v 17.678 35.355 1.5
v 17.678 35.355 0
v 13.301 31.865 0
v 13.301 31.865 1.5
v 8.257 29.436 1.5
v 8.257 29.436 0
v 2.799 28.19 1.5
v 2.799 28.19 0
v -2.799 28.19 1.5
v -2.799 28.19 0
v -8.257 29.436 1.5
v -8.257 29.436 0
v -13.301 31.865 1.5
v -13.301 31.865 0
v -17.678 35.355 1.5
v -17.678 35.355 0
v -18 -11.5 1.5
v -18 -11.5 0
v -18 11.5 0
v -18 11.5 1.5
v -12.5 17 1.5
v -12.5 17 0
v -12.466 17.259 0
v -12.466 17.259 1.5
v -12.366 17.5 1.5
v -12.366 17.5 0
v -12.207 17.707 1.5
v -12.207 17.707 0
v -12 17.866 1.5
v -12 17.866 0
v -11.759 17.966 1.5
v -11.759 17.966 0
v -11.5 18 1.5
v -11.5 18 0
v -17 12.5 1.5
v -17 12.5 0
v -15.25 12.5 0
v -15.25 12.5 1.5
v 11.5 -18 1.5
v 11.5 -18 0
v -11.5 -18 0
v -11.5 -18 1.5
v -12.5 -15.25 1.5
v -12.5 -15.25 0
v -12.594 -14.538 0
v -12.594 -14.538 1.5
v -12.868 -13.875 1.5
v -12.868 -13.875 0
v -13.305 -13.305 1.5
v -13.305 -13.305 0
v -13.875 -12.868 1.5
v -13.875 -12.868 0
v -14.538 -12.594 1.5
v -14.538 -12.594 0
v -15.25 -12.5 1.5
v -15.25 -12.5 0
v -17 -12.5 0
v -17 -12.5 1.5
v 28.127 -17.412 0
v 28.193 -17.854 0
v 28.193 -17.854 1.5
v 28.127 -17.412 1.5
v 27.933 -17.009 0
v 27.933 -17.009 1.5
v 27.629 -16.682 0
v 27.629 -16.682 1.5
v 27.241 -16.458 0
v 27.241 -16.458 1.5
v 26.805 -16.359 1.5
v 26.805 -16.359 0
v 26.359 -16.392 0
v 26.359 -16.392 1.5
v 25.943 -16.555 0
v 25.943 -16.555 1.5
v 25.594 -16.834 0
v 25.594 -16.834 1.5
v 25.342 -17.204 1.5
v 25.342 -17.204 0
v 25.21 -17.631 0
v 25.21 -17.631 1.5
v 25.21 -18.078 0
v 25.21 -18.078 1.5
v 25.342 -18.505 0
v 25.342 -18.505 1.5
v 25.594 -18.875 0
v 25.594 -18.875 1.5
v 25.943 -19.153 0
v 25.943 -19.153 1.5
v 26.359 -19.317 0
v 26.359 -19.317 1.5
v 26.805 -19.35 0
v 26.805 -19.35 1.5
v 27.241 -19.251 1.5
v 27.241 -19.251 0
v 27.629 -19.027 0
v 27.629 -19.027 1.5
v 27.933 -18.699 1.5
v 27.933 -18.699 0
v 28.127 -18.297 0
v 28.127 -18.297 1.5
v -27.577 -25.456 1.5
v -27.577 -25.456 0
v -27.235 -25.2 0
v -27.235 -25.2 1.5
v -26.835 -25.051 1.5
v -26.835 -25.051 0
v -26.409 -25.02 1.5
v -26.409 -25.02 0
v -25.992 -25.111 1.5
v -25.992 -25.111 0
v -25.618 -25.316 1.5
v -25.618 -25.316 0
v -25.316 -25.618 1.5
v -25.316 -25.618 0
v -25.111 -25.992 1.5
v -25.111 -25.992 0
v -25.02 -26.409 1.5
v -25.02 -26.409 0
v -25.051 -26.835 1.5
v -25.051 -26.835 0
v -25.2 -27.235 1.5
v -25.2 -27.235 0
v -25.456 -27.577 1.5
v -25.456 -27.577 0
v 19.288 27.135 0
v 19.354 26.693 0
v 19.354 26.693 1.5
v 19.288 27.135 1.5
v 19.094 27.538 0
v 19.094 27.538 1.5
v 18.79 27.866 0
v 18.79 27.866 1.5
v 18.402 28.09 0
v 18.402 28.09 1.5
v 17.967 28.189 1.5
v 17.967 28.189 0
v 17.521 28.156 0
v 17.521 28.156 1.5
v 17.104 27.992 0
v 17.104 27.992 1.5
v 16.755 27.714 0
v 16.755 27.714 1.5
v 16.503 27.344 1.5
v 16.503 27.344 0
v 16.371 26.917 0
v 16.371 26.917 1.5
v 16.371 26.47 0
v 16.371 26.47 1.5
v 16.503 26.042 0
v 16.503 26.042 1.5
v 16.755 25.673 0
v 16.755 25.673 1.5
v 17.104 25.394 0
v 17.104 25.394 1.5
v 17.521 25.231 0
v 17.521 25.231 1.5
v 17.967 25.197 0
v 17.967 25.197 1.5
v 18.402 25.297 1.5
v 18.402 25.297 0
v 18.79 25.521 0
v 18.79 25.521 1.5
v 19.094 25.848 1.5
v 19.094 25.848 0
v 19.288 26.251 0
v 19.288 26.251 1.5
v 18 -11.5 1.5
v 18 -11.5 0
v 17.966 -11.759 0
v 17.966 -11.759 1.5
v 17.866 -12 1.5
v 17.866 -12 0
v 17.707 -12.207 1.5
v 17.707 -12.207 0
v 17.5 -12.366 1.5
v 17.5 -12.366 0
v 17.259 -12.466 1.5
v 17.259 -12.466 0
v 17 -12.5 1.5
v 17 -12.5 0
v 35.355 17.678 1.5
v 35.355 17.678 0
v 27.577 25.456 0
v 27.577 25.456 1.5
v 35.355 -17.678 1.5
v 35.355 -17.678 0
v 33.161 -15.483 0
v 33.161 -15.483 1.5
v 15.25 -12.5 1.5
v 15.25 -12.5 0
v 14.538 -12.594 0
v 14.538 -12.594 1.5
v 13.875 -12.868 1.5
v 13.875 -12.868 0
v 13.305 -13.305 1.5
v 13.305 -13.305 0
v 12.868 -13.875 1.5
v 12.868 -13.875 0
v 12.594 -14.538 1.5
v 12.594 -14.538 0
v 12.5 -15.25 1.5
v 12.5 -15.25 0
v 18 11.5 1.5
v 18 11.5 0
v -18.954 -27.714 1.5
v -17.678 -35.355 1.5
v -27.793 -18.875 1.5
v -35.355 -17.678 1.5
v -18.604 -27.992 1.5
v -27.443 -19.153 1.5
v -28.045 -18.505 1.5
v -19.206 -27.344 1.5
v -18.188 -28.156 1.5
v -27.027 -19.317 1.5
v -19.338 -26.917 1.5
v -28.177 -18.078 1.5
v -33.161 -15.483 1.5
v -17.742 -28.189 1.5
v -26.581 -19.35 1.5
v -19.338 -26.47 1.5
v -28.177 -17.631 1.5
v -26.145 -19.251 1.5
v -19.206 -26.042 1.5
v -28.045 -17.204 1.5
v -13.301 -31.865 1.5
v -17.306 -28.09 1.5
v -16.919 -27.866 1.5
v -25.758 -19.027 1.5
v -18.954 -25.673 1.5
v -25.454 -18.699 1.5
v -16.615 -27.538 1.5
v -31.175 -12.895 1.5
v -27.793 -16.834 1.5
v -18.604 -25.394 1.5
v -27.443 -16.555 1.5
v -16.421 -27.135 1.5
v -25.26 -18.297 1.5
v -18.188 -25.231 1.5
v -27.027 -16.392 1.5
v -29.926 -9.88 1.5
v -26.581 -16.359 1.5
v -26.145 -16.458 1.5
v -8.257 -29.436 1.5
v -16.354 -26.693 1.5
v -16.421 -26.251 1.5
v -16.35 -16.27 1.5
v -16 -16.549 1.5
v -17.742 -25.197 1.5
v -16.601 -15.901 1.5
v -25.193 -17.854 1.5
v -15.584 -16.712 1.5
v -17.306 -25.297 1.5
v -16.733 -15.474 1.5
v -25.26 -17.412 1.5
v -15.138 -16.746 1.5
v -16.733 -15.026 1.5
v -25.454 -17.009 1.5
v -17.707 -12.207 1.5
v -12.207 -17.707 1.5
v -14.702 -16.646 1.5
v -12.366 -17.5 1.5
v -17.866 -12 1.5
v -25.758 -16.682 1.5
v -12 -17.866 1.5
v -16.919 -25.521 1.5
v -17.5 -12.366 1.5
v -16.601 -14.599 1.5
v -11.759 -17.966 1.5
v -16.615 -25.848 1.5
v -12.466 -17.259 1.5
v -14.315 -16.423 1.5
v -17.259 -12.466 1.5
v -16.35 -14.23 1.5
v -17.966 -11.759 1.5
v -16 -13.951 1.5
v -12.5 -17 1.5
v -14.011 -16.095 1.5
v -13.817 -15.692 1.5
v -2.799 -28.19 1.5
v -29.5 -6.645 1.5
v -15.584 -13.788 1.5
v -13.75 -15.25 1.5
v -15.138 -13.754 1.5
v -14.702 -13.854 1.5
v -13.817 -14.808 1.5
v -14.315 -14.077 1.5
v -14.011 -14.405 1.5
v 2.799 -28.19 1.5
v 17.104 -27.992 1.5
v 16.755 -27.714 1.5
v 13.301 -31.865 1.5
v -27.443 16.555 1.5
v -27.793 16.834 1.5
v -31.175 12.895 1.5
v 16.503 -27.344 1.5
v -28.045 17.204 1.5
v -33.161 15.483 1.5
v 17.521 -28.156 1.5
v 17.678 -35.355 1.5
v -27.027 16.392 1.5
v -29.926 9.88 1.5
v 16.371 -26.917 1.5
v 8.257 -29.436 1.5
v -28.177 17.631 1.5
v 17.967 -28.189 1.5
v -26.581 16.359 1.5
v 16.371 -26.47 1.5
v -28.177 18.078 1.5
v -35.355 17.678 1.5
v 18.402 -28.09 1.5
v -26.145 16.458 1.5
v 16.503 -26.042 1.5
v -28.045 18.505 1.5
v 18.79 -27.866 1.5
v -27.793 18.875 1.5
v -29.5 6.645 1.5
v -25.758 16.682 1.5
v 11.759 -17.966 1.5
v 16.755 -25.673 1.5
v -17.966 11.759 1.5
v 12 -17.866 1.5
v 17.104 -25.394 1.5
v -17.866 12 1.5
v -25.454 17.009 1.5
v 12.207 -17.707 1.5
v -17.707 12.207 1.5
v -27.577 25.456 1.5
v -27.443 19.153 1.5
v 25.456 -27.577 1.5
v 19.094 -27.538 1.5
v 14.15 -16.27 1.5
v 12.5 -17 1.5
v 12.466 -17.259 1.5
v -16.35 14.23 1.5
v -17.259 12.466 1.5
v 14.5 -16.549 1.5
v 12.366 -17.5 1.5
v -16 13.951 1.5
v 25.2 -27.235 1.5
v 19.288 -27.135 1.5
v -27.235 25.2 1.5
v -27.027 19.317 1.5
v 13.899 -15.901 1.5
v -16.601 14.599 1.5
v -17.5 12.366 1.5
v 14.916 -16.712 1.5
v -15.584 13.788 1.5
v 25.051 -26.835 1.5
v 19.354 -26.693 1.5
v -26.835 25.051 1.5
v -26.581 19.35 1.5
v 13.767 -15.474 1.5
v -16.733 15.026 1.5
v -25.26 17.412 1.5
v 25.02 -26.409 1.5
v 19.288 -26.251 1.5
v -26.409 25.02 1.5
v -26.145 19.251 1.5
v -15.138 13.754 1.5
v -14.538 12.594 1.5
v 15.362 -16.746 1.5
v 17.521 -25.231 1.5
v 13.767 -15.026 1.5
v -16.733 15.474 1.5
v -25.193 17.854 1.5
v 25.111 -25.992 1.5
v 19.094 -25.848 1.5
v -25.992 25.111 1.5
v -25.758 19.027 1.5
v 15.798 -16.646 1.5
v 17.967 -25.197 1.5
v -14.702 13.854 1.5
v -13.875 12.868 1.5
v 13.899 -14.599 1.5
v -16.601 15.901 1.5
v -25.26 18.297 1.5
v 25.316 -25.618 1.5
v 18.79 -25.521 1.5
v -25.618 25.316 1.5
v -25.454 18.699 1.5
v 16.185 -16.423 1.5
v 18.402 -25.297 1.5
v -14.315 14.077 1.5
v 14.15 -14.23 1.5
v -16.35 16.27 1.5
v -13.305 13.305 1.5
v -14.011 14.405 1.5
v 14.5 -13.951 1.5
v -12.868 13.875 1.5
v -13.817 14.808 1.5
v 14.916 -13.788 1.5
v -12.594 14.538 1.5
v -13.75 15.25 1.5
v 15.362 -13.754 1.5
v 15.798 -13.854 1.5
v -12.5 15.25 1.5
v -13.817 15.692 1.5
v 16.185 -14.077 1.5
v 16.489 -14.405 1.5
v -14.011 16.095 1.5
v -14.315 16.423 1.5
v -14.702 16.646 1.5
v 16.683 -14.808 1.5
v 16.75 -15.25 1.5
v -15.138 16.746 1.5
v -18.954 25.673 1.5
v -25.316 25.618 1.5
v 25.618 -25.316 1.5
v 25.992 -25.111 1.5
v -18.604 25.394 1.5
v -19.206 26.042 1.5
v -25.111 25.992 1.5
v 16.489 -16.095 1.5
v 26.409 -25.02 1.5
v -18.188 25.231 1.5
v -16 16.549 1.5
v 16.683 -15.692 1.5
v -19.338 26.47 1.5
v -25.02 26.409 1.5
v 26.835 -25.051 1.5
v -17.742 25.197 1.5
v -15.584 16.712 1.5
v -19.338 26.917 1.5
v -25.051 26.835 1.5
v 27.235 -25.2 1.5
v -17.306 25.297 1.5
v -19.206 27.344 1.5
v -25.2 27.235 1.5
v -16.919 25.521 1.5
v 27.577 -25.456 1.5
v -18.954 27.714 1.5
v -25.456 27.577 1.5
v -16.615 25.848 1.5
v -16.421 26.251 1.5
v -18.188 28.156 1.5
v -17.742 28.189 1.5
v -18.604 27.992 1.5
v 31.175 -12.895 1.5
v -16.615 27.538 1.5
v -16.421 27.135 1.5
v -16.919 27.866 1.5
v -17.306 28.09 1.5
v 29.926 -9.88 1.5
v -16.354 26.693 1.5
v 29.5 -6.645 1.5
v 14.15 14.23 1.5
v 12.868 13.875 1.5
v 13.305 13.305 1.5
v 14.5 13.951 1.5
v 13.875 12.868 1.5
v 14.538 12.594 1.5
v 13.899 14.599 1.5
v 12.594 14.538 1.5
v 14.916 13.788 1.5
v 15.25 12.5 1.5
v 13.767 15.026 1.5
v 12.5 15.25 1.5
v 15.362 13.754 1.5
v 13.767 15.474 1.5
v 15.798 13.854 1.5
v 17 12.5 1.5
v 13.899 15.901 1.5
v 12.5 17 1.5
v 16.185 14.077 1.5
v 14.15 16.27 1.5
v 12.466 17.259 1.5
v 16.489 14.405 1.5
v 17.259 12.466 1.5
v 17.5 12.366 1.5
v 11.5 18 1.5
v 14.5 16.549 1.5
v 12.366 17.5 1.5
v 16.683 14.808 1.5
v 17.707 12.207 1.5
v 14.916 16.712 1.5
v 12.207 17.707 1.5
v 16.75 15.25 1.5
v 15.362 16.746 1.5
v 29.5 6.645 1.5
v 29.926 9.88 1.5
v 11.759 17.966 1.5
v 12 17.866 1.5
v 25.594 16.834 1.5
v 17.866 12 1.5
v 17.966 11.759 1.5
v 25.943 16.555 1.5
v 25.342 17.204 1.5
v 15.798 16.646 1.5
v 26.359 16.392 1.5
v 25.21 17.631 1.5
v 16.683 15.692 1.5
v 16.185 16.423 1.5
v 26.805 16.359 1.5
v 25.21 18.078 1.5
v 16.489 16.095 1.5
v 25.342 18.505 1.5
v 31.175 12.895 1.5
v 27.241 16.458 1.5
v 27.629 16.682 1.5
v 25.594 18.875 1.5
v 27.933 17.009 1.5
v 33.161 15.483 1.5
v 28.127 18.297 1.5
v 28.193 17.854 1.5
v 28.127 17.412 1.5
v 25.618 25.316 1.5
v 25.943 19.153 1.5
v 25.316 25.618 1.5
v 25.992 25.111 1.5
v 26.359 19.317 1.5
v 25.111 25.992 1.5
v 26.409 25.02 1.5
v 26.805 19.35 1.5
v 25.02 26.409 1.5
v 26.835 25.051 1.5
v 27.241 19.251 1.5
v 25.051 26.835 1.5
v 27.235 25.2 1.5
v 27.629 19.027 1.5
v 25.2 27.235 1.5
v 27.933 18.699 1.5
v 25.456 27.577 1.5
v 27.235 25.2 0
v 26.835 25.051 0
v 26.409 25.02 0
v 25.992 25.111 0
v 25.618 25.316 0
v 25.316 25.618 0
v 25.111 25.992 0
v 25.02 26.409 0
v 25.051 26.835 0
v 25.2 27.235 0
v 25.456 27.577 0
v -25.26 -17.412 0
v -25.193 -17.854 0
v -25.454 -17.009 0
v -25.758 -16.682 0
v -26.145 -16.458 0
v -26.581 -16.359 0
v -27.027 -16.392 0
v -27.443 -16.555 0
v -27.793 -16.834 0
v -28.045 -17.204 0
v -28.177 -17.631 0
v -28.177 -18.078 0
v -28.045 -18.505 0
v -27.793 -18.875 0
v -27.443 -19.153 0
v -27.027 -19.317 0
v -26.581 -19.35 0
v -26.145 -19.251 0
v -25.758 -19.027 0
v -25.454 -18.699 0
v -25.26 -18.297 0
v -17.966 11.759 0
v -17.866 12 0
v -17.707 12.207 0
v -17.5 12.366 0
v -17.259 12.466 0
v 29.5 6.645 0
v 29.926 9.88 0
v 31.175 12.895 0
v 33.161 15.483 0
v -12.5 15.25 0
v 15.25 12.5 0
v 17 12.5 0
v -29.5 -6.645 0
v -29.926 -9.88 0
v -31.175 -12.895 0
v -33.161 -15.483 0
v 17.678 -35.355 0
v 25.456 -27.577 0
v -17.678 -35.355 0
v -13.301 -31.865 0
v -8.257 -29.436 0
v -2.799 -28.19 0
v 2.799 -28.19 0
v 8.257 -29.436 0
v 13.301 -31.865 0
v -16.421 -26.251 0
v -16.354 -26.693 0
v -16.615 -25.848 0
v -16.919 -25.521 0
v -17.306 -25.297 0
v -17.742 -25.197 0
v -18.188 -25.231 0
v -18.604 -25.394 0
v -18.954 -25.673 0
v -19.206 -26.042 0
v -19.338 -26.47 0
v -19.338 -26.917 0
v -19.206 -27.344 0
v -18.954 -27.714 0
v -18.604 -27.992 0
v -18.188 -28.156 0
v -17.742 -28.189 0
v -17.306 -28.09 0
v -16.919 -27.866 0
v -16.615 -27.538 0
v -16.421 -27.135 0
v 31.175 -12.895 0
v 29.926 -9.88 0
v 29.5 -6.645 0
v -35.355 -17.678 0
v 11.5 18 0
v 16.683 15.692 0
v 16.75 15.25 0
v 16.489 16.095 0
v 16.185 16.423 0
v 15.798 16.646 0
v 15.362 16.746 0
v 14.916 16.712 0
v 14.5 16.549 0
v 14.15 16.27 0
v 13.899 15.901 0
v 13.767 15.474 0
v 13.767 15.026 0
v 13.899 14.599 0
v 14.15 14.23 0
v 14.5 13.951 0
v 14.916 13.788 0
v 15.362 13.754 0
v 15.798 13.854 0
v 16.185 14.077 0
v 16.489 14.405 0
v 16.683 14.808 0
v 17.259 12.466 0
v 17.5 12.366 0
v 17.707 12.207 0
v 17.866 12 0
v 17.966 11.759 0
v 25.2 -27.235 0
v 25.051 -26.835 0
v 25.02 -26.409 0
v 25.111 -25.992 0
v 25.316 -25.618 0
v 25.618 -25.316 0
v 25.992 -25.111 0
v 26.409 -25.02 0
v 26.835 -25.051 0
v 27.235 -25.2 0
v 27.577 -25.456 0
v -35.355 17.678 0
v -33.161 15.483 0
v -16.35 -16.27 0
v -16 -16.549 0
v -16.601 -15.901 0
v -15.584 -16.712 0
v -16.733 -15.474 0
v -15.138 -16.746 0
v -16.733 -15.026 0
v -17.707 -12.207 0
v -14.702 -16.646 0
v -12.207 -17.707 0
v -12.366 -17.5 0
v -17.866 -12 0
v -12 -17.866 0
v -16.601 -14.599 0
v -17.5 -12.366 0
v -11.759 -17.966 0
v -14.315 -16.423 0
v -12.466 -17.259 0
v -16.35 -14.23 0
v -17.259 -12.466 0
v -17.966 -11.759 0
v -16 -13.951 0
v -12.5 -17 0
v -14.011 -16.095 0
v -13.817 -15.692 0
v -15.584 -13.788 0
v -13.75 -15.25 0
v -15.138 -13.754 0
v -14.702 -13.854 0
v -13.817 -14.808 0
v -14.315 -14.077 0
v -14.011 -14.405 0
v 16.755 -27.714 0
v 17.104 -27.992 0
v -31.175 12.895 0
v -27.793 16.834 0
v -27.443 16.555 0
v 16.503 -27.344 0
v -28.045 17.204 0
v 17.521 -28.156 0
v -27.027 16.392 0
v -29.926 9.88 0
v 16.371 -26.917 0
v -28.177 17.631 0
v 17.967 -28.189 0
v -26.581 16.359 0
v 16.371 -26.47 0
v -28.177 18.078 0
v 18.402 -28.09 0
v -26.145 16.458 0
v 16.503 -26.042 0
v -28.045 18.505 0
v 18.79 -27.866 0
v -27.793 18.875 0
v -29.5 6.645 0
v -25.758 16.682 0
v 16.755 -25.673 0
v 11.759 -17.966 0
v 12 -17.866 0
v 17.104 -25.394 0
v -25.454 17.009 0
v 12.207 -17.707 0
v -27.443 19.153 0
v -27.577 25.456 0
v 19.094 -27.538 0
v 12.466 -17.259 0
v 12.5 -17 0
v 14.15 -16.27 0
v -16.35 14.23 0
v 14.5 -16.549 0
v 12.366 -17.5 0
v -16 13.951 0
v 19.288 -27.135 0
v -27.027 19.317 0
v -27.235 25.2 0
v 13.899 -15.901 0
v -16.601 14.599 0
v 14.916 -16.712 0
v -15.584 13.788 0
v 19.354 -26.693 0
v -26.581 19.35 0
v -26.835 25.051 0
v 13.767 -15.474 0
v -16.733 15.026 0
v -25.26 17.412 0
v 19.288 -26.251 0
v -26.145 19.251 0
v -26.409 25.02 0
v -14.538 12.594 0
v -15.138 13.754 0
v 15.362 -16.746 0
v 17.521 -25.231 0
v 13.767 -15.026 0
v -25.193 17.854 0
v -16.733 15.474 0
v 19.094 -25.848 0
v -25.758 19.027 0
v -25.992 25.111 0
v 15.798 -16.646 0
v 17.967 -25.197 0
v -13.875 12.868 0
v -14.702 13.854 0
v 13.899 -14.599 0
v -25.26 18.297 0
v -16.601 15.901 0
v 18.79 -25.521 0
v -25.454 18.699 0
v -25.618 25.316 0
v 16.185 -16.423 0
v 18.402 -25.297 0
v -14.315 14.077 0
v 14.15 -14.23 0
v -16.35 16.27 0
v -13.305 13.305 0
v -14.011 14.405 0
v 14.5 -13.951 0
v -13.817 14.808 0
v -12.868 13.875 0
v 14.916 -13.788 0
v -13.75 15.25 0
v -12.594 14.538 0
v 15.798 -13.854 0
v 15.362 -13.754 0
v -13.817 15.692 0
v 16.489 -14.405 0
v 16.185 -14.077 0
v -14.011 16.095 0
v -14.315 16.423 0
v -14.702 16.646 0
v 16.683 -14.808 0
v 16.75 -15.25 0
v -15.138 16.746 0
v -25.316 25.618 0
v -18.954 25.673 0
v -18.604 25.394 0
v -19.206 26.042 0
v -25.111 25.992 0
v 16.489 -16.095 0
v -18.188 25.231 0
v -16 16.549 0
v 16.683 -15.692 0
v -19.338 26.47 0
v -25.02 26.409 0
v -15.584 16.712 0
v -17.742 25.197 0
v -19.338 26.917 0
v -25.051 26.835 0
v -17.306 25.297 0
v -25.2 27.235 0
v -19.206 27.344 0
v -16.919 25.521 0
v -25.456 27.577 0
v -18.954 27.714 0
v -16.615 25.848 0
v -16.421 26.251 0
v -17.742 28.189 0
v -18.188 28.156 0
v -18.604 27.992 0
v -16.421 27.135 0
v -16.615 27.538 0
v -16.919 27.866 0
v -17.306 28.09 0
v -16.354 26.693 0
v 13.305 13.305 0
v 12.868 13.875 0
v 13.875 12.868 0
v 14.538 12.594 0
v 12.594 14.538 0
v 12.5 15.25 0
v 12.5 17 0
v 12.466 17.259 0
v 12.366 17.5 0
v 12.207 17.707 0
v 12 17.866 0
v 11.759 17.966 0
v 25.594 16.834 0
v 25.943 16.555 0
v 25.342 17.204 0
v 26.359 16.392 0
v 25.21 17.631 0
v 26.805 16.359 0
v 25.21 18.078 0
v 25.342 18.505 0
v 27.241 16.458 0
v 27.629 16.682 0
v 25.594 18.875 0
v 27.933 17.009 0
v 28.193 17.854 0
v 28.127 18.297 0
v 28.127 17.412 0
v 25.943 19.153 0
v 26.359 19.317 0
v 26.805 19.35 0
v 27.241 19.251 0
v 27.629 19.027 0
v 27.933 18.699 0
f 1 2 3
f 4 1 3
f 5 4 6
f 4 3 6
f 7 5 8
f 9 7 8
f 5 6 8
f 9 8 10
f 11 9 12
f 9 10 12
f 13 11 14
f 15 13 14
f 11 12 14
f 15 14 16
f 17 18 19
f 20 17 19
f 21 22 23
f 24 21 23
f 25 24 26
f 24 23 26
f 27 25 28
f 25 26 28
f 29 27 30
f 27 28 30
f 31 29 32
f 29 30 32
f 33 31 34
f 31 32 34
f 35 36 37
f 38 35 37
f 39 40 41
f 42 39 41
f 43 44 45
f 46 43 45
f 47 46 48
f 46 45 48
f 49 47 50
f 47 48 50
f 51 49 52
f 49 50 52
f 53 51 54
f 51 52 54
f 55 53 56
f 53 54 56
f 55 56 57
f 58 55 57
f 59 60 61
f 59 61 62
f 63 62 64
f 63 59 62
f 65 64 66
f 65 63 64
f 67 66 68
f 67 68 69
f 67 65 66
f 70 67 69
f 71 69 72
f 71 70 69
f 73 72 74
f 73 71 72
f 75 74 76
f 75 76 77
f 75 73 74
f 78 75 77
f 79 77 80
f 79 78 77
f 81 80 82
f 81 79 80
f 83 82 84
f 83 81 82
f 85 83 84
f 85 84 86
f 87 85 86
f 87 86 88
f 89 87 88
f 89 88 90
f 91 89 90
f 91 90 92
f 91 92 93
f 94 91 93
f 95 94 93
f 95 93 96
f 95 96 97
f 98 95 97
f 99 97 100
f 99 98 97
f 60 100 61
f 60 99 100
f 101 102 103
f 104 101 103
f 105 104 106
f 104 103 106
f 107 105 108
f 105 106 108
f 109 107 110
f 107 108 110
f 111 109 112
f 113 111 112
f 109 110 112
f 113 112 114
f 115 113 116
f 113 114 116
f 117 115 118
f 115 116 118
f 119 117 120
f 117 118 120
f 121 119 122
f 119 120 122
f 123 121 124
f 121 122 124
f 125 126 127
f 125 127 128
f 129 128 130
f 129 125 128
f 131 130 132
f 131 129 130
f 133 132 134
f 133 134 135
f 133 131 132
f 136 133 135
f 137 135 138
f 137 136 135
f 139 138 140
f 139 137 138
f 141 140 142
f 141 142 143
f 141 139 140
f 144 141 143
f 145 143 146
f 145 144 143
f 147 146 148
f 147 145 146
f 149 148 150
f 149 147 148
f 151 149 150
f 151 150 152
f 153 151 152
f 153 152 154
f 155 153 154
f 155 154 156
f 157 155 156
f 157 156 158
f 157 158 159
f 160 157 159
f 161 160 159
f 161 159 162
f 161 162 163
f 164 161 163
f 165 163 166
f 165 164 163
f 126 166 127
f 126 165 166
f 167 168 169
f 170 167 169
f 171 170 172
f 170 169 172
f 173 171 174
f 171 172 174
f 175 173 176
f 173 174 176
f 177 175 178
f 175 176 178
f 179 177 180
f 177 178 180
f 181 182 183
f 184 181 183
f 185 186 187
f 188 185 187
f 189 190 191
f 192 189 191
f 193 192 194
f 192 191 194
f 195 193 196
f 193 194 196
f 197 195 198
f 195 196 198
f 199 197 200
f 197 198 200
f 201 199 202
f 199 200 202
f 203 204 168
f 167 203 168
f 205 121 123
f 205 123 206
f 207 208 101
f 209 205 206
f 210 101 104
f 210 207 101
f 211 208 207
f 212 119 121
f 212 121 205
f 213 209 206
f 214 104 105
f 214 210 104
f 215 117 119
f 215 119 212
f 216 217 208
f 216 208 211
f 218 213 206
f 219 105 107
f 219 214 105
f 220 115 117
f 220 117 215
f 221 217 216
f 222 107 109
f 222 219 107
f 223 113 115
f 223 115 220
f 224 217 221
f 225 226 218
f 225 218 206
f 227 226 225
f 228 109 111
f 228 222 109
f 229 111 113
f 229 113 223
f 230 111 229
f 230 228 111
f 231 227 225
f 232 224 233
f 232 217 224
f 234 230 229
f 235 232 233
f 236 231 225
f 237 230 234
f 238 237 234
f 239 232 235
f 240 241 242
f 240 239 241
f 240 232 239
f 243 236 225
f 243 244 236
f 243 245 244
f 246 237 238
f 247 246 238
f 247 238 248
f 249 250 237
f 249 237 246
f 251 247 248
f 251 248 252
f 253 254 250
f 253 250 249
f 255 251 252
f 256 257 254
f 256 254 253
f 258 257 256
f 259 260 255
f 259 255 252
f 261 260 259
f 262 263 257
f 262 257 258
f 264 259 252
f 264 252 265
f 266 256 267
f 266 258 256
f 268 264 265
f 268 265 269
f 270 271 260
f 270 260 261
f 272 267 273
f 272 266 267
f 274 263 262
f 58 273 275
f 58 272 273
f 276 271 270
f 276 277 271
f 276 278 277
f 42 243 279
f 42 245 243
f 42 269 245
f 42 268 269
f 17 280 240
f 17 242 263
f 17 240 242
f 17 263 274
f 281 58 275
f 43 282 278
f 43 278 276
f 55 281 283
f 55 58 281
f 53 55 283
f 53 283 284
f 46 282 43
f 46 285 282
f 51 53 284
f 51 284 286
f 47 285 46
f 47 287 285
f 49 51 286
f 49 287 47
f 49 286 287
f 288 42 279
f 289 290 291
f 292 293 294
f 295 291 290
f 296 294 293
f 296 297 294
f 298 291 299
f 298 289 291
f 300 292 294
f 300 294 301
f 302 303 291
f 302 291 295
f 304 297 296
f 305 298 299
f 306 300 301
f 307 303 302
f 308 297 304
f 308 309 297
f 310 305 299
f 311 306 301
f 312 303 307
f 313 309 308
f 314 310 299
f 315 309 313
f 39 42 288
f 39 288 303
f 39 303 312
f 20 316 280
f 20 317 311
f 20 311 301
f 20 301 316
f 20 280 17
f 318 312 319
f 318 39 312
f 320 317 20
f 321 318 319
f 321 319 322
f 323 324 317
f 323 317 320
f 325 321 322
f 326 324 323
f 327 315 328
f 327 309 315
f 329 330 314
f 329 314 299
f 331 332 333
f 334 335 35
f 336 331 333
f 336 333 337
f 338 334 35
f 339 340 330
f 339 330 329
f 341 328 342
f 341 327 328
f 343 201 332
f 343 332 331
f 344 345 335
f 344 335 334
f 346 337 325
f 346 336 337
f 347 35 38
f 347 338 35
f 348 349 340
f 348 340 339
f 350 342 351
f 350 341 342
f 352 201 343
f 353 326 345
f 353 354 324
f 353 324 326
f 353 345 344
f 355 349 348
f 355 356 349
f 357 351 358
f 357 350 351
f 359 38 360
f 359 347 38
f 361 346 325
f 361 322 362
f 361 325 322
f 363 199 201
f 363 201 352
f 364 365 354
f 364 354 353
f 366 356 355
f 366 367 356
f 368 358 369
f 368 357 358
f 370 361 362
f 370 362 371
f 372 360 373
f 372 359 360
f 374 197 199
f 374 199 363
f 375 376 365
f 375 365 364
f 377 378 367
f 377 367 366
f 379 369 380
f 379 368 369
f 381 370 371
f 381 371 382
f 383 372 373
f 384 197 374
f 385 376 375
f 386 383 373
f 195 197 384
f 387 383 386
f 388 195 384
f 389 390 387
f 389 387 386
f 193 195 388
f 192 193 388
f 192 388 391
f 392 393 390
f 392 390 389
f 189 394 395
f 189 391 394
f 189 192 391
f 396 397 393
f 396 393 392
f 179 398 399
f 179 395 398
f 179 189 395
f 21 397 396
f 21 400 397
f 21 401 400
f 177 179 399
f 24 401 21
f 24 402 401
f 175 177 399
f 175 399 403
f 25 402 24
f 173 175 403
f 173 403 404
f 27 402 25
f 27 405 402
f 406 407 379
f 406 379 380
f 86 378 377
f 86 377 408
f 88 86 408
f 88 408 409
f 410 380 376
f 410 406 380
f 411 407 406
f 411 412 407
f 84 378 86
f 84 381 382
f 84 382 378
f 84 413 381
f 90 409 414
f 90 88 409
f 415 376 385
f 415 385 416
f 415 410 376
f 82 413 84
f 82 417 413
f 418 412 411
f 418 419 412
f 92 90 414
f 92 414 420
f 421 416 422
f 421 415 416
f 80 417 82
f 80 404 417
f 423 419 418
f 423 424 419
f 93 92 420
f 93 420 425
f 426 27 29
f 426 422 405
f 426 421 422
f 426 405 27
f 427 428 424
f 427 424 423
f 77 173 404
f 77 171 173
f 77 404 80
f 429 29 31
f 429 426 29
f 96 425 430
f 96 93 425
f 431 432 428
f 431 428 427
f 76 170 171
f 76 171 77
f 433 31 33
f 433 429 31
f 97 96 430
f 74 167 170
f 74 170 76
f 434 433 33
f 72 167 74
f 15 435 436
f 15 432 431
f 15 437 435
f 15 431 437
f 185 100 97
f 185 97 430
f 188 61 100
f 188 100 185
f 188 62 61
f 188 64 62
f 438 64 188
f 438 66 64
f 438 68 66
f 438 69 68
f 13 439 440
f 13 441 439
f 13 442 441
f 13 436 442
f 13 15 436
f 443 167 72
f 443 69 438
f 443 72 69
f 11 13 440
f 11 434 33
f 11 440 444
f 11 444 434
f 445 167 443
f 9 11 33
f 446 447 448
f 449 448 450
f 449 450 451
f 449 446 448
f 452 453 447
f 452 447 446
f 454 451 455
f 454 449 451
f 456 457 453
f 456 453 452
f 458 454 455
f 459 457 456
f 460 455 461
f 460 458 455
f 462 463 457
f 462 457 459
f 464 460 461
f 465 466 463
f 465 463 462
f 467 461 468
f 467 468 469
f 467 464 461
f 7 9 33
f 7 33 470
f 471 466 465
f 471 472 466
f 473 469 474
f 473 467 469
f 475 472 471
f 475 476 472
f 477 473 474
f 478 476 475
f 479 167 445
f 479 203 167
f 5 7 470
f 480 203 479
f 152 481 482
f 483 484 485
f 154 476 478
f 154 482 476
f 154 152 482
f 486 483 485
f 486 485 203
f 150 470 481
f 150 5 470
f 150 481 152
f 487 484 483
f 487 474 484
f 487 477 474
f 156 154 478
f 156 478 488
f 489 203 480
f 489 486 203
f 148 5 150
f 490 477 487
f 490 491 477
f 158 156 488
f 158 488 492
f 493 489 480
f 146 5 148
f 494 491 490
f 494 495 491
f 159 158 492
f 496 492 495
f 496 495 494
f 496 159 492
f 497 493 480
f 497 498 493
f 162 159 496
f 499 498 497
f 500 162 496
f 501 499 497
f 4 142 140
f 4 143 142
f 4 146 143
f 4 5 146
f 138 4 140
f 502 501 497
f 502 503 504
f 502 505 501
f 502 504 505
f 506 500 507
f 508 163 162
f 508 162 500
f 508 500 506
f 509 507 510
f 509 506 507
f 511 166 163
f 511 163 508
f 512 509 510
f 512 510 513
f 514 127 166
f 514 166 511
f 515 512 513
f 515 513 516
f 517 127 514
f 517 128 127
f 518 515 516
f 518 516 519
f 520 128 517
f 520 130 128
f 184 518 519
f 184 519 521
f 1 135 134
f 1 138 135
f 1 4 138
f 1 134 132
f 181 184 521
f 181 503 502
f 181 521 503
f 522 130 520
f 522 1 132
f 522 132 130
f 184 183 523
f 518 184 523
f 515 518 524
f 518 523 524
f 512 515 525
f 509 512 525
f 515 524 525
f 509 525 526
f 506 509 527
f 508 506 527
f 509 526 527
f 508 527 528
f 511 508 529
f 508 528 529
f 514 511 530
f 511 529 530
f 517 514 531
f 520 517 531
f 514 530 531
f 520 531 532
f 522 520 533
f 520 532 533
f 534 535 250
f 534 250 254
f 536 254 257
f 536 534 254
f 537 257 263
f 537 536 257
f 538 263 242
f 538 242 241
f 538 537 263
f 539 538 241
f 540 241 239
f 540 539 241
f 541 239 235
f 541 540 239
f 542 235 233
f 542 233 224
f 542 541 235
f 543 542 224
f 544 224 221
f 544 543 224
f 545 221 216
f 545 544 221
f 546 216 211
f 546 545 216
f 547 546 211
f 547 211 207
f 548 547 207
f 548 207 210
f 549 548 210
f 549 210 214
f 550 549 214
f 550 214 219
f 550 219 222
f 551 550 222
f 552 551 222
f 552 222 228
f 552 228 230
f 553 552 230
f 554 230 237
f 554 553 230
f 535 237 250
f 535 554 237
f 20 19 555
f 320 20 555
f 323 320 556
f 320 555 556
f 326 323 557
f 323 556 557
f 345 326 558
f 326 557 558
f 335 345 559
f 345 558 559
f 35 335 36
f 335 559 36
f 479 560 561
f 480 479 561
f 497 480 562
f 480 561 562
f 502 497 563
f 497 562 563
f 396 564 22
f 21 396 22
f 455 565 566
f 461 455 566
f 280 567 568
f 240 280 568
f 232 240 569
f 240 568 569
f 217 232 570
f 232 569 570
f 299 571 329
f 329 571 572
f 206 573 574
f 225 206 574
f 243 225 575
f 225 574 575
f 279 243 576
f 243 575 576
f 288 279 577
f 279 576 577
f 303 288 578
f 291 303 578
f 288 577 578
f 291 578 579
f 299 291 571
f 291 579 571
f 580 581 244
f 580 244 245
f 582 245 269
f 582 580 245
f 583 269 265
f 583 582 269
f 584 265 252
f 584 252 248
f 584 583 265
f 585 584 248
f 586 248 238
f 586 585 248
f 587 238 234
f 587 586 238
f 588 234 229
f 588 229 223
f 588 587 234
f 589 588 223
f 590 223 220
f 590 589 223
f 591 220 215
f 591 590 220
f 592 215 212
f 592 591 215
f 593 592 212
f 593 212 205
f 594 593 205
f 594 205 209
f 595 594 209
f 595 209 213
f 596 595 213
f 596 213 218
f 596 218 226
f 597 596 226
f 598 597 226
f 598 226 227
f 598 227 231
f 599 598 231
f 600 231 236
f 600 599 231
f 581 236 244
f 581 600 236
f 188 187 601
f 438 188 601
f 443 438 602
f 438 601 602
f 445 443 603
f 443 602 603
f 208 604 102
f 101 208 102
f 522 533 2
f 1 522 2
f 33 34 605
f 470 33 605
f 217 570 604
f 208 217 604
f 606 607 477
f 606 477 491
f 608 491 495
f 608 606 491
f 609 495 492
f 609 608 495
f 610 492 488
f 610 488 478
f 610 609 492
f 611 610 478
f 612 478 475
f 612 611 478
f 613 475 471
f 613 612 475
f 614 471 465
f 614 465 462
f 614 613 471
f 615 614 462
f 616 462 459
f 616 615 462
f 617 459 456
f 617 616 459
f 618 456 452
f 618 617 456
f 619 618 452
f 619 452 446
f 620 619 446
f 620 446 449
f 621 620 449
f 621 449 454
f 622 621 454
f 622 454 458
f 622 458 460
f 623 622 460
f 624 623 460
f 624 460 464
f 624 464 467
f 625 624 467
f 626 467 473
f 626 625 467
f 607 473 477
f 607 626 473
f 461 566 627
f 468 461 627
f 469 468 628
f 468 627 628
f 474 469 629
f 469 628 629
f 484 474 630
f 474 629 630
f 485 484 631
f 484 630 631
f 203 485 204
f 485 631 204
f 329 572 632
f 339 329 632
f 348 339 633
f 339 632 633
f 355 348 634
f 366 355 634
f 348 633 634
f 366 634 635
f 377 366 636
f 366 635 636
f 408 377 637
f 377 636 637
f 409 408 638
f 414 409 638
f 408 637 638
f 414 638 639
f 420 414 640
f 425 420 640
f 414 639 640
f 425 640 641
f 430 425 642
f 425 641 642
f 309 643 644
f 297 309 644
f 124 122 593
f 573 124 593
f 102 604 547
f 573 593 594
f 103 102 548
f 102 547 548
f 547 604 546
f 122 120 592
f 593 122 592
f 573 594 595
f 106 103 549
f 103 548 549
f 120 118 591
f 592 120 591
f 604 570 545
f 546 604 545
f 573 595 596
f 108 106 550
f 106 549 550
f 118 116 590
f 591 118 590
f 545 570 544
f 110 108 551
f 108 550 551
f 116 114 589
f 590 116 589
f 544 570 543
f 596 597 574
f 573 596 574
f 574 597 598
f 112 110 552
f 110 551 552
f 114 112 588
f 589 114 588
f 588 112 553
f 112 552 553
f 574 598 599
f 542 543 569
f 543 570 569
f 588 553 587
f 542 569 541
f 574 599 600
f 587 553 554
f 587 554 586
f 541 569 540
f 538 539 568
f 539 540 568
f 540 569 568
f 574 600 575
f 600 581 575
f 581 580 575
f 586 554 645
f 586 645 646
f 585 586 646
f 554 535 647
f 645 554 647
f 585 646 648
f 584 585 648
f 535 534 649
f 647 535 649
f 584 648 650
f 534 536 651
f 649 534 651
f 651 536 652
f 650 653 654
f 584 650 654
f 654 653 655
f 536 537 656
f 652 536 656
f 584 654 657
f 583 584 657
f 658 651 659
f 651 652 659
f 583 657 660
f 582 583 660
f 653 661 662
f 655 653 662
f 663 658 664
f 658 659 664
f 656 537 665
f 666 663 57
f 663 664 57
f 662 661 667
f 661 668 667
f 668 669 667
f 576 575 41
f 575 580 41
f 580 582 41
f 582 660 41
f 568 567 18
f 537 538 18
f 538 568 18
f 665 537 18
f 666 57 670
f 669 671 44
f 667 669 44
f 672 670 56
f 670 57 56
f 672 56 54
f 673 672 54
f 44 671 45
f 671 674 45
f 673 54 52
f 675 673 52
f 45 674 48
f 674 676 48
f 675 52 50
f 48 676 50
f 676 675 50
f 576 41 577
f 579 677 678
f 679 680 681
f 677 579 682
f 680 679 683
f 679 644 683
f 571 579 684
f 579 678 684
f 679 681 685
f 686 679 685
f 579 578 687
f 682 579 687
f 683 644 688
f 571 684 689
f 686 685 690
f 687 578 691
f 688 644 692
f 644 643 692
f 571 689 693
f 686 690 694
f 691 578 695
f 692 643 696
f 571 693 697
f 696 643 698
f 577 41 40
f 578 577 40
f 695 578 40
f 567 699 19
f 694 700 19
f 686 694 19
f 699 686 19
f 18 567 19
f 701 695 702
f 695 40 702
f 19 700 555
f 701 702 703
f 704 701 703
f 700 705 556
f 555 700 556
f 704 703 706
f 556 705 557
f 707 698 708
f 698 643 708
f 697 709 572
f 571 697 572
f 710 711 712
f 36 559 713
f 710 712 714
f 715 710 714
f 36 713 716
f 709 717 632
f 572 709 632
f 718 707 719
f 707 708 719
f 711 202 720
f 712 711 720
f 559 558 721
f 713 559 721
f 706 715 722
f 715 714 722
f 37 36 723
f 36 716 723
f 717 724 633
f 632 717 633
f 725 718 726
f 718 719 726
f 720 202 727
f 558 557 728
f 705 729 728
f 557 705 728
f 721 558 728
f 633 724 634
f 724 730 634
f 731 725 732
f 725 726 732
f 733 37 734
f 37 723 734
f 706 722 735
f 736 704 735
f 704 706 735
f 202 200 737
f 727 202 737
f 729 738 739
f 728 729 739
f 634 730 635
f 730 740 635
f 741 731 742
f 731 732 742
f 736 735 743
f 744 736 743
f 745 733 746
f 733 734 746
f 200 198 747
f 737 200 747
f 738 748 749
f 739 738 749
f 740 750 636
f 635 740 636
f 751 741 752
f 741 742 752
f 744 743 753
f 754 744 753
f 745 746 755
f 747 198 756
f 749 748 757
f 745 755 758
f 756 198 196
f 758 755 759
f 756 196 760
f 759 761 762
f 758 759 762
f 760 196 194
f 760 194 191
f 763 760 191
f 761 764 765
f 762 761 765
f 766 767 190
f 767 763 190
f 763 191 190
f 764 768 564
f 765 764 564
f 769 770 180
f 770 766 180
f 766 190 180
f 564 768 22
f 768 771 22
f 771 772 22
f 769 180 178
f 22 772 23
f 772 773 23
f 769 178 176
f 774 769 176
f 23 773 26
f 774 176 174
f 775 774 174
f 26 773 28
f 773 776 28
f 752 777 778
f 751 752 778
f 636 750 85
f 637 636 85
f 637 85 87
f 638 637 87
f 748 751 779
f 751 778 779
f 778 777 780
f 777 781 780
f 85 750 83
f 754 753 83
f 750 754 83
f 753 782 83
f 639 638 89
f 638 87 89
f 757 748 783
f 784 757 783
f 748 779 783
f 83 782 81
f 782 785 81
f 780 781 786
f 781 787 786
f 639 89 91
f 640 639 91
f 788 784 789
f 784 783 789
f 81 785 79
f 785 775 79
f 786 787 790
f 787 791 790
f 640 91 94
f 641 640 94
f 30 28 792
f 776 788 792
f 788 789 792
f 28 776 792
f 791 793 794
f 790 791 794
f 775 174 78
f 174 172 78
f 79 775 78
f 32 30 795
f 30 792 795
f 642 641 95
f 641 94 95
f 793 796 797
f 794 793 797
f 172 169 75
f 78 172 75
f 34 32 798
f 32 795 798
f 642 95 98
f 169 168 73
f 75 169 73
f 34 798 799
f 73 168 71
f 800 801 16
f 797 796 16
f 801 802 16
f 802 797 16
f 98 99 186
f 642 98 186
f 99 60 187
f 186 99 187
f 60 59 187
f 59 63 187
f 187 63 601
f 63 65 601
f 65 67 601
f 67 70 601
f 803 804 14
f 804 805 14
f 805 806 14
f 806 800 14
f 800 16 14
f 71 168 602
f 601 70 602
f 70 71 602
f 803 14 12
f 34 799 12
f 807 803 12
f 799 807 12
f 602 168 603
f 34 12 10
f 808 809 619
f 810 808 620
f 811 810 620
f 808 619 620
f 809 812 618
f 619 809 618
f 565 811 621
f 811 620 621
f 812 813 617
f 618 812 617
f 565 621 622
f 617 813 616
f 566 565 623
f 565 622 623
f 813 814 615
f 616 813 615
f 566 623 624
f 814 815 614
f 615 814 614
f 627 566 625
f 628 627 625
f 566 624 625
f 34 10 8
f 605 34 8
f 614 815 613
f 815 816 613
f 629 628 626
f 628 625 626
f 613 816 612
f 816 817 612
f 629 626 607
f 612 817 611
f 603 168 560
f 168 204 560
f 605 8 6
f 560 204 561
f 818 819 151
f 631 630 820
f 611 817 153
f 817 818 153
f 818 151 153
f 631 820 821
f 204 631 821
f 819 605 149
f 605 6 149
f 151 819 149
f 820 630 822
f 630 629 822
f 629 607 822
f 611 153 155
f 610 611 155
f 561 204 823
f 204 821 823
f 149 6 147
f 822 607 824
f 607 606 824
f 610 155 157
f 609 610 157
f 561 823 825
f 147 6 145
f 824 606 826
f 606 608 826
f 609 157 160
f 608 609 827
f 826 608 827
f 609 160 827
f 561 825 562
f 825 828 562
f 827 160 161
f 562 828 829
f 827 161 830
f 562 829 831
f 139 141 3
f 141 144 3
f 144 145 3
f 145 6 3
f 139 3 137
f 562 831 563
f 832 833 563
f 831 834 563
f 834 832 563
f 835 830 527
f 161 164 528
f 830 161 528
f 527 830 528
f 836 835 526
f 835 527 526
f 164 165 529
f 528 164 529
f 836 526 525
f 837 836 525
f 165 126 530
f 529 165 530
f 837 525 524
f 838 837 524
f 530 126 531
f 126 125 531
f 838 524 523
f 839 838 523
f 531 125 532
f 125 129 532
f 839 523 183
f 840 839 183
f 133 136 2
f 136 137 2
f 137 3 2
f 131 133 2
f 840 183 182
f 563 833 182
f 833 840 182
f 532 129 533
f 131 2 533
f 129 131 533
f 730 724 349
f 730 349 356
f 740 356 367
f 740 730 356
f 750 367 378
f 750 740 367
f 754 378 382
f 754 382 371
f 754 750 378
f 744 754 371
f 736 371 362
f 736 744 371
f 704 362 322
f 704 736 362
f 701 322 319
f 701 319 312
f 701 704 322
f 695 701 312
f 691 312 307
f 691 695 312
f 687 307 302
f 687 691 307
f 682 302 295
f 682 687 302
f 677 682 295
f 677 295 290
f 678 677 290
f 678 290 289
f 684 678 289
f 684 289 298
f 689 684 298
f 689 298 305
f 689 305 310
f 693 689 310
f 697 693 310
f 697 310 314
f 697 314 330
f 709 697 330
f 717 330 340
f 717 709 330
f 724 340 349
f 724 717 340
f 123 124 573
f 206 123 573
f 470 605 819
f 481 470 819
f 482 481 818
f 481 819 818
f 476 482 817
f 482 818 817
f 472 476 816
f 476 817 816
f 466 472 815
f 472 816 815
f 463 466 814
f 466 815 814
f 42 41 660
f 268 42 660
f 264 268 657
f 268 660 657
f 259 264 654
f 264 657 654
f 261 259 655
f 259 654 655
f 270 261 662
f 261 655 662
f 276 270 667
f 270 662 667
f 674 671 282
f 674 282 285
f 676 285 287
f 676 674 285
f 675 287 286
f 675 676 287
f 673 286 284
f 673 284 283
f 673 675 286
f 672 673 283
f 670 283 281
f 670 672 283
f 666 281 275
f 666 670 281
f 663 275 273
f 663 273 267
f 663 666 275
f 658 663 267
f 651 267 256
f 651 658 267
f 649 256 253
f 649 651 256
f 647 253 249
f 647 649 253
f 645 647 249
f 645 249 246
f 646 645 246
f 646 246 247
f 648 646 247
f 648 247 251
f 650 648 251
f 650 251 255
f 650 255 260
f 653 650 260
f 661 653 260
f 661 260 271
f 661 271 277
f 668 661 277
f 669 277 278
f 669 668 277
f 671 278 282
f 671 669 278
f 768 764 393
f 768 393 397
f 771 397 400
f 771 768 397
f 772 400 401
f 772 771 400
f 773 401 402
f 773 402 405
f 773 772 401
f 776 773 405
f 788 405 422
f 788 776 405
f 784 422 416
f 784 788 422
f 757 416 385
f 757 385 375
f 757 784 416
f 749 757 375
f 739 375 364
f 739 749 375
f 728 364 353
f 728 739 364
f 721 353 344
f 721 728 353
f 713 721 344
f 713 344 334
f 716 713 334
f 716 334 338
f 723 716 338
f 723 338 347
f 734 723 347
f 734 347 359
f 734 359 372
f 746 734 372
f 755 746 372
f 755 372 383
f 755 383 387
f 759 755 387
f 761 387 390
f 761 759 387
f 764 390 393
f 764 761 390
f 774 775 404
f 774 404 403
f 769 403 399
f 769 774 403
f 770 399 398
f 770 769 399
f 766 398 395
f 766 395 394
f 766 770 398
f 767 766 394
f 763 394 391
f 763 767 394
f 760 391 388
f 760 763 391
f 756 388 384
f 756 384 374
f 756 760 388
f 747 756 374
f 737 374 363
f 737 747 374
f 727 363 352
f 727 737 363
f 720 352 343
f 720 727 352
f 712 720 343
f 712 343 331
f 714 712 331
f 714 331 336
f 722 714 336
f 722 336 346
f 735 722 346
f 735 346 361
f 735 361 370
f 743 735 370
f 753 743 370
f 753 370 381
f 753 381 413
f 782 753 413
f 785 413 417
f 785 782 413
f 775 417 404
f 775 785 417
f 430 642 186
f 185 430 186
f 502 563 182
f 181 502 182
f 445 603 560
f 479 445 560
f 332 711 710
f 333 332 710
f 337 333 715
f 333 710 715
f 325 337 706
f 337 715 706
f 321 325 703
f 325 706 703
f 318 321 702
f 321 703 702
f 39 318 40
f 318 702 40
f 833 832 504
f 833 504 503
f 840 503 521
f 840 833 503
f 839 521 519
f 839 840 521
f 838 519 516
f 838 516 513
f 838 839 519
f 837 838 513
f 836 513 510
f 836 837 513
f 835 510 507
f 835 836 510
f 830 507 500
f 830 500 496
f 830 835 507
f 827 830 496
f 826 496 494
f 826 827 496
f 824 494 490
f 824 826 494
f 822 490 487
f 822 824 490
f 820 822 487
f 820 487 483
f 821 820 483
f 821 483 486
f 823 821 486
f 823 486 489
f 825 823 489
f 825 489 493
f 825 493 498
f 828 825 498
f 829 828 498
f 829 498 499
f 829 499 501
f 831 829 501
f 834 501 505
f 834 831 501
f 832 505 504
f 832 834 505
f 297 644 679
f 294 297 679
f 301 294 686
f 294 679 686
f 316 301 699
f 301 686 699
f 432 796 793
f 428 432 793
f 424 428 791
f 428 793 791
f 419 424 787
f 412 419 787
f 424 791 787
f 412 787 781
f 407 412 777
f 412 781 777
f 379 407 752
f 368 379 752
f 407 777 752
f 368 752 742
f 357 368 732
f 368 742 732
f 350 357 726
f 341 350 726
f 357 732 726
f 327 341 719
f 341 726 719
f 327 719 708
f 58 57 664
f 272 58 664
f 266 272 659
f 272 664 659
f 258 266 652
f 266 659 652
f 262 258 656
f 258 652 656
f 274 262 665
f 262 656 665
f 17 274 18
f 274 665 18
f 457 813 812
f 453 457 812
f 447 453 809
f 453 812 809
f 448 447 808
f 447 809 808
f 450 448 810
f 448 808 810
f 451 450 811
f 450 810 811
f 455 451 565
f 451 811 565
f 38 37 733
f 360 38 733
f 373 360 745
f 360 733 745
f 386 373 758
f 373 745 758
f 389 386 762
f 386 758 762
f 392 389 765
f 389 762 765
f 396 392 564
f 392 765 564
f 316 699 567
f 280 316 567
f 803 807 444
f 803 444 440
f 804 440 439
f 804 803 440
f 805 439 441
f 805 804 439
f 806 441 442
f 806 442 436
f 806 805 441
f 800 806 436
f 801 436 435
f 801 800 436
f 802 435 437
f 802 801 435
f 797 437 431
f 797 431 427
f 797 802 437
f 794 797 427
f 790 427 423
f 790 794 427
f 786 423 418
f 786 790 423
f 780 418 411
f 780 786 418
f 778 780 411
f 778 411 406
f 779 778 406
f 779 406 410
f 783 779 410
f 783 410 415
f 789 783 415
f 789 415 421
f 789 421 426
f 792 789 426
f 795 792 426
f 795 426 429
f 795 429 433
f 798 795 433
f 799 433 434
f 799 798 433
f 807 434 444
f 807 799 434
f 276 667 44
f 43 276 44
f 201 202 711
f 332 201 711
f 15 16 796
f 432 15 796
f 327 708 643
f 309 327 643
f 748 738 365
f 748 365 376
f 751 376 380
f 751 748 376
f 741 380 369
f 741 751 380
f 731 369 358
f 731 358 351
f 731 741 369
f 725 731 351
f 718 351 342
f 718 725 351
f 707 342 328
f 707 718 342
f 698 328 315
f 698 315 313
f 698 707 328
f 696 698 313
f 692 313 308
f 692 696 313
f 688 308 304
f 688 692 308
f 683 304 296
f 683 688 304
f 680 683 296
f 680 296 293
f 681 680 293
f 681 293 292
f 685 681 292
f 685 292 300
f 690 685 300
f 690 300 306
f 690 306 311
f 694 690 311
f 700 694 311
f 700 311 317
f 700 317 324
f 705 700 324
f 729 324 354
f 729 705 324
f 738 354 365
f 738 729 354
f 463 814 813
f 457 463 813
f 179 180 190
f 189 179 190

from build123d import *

# Parameters (mm, degrees)
F0_R     = 1.5
F1_DEPTH = 1.5


# Not quite as in the source:
# - ends of sketch curves that miss each other by under 0.0002 mm in the source are joined


with BuildPart() as f1:
    # F0 (on Top) → F1 (new body)
    with BuildSketch(Plane.XY):
        with BuildLine():
            Line((-29.5, 6.644661), (-29.5, 0))
            Line((-29.5, 0), (-29.5, -6.644661))
            ThreePointArc((-29.5, -6.644661), (-30.4515057083, -11.4282035779), (-33.1611647352, -15.4834952648))
            Line((-33.1611647352, -15.4834952648), (-35.355339, -17.677669))
            Line((-35.355339, -17.677669), (-27.577165, -25.455844))
            ThreePointArc((-27.577165, -25.455844), (-25.4558450782, -25.4558435782), (-25.4558443282, -27.5771636718))
            Line((-25.4558443282, -27.5771636718), (-17.67767, -35.355339))
            ThreePointArc((-17.67767, -35.355339), (-3.536e-07, -28.033008), (17.6776695297, -35.3553384703))
            Line((17.6776695297, -35.3553384703), (25.455844, -27.577164))
            ThreePointArc((25.455844, -27.577164), (25.4558438282, -25.4558438282), (27.5771641718, -25.4558438282))
            Line((27.5771641718, -25.4558438282), (35.355339, -17.677669))
            Line((35.355339, -17.677669), (33.161165, -15.483495))
            ThreePointArc((33.161165, -15.483495), (30.4515057083, -11.4282035779), (29.5, -6.644661))
            Line((29.5, -6.644661), (29.5, 0))
            Line((29.5, 0), (29.5, 6.644661))
            ThreePointArc((29.5, 6.644661), (30.4515058436, 11.4282039046), (33.1611652352, 15.4834957648))
            Line((33.1611652352, 15.4834957648), (35.355339, 17.67767))
            Line((35.355339, 17.67767), (27.577164, 25.455844))
            ThreePointArc((27.577164, 25.455844), (25.4558435782, 25.4558450782), (25.4558438282, 27.5771651718))
            Line((25.4558438282, 27.5771651718), (17.677669, 35.355339))
            ThreePointArc((17.677669, 35.355339), (-3.536e-07, 28.033009), (-17.6776695297, 35.3553394703))
            Line((-17.6776695297, 35.3553394703), (-25.455844, 27.577165))
            ThreePointArc((-25.455844, 27.577165), (-25.4558448282, 25.4558448282), (-27.5771646718, 25.4558443282))
            Line((-27.5771646718, 25.4558443282), (-35.355339, 17.67767))
            Line((-35.355339, 17.67767), (-33.161165, 15.483496))
            ThreePointArc((-33.161165, 15.483496), (-30.4515058436, 11.4282039046), (-29.5, 6.644661))
        make_face()
        with Locations((-17.854446, -26.693281)):
            Circle(F0_R, mode=Mode.SUBTRACT)
        with Locations((-26.693281, -17.854446)):
            Circle(F0_R, mode=Mode.SUBTRACT)
        with Locations((-15.25, -15.25)):
            Circle(F0_R, mode=Mode.SUBTRACT)
        with Locations((17.854446, -26.693281)):
            Circle(F0_R, mode=Mode.SUBTRACT)
        with Locations((26.693281, -17.854446)):
            Circle(F0_R, mode=Mode.SUBTRACT)
        with Locations((15.25, -15.25)):
            Circle(F0_R, mode=Mode.SUBTRACT)
        with BuildLine():
            Line((11.5, -18), (-11.5, -18))
            ThreePointArc((-11.5, -18), (-12.2071067812, -17.7071067812), (-12.5, -17))
            Line((-12.5, -17), (-12.5, -15.25))
            ThreePointArc((-12.5, -15.25), (-13.3054563517, -13.3054563517), (-15.25, -12.5))
            Line((-15.25, -12.5), (-17, -12.5))
            ThreePointArc((-17, -12.5), (-17.7071067812, -12.2071067812), (-18, -11.5))
            Line((-18, -11.5), (-18, 11.5))
            ThreePointArc((-18, 11.5), (-17.7071067812, 12.2071067812), (-17, 12.5))
            Line((-17, 12.5), (-15.25, 12.5))
            ThreePointArc((-15.25, 12.5), (-13.3054563517, 13.3054563517), (-12.5, 15.25))
            Line((-12.5, 15.25), (-12.5, 17))
            ThreePointArc((-12.5, 17), (-12.2071067812, 17.7071067812), (-11.5, 18))
            Line((-11.5, 18), (11.5, 18))
            ThreePointArc((11.5, 18), (12.2071067812, 17.7071067812), (12.5, 17))
            Line((12.5, 17), (12.5, 15.25))
            ThreePointArc((12.5, 15.25), (13.3054563517, 13.3054563517), (15.25, 12.5))
            Line((15.25, 12.5), (17, 12.5))
            ThreePointArc((17, 12.5), (17.7071067812, 12.2071067812), (18, 11.5))
            Line((18, 11.5), (18, -11.5))
            ThreePointArc((18, -11.5), (17.7071067812, -12.2071067812), (17, -12.5))
            Line((17, -12.5), (15.25, -12.5))
            ThreePointArc((15.25, -12.5), (13.3054563517, -13.3054563517), (12.5, -15.25))
            Line((12.5, -15.25), (12.5, -17))
            ThreePointArc((12.5, -17), (12.2071067812, -17.7071067812), (11.5, -18))
        make_face(mode=Mode.SUBTRACT)
        with Locations((-15.25, 15.25)):
            Circle(F0_R, mode=Mode.SUBTRACT)
        with Locations((-26.693281, 17.854447)):
            Circle(F0_R, mode=Mode.SUBTRACT)
        with Locations((-17.854446, 26.693281)):
            Circle(F0_R, mode=Mode.SUBTRACT)
        with Locations((15.25, 15.25)):
            Circle(F0_R, mode=Mode.SUBTRACT)
        with Locations((26.693281, 17.854447)):
            Circle(F0_R, mode=Mode.SUBTRACT)
        with Locations((17.854446, 26.693281)):
            Circle(F0_R, mode=Mode.SUBTRACT)
    extrude(amount=F1_DEPTH)


solid = f1.part
